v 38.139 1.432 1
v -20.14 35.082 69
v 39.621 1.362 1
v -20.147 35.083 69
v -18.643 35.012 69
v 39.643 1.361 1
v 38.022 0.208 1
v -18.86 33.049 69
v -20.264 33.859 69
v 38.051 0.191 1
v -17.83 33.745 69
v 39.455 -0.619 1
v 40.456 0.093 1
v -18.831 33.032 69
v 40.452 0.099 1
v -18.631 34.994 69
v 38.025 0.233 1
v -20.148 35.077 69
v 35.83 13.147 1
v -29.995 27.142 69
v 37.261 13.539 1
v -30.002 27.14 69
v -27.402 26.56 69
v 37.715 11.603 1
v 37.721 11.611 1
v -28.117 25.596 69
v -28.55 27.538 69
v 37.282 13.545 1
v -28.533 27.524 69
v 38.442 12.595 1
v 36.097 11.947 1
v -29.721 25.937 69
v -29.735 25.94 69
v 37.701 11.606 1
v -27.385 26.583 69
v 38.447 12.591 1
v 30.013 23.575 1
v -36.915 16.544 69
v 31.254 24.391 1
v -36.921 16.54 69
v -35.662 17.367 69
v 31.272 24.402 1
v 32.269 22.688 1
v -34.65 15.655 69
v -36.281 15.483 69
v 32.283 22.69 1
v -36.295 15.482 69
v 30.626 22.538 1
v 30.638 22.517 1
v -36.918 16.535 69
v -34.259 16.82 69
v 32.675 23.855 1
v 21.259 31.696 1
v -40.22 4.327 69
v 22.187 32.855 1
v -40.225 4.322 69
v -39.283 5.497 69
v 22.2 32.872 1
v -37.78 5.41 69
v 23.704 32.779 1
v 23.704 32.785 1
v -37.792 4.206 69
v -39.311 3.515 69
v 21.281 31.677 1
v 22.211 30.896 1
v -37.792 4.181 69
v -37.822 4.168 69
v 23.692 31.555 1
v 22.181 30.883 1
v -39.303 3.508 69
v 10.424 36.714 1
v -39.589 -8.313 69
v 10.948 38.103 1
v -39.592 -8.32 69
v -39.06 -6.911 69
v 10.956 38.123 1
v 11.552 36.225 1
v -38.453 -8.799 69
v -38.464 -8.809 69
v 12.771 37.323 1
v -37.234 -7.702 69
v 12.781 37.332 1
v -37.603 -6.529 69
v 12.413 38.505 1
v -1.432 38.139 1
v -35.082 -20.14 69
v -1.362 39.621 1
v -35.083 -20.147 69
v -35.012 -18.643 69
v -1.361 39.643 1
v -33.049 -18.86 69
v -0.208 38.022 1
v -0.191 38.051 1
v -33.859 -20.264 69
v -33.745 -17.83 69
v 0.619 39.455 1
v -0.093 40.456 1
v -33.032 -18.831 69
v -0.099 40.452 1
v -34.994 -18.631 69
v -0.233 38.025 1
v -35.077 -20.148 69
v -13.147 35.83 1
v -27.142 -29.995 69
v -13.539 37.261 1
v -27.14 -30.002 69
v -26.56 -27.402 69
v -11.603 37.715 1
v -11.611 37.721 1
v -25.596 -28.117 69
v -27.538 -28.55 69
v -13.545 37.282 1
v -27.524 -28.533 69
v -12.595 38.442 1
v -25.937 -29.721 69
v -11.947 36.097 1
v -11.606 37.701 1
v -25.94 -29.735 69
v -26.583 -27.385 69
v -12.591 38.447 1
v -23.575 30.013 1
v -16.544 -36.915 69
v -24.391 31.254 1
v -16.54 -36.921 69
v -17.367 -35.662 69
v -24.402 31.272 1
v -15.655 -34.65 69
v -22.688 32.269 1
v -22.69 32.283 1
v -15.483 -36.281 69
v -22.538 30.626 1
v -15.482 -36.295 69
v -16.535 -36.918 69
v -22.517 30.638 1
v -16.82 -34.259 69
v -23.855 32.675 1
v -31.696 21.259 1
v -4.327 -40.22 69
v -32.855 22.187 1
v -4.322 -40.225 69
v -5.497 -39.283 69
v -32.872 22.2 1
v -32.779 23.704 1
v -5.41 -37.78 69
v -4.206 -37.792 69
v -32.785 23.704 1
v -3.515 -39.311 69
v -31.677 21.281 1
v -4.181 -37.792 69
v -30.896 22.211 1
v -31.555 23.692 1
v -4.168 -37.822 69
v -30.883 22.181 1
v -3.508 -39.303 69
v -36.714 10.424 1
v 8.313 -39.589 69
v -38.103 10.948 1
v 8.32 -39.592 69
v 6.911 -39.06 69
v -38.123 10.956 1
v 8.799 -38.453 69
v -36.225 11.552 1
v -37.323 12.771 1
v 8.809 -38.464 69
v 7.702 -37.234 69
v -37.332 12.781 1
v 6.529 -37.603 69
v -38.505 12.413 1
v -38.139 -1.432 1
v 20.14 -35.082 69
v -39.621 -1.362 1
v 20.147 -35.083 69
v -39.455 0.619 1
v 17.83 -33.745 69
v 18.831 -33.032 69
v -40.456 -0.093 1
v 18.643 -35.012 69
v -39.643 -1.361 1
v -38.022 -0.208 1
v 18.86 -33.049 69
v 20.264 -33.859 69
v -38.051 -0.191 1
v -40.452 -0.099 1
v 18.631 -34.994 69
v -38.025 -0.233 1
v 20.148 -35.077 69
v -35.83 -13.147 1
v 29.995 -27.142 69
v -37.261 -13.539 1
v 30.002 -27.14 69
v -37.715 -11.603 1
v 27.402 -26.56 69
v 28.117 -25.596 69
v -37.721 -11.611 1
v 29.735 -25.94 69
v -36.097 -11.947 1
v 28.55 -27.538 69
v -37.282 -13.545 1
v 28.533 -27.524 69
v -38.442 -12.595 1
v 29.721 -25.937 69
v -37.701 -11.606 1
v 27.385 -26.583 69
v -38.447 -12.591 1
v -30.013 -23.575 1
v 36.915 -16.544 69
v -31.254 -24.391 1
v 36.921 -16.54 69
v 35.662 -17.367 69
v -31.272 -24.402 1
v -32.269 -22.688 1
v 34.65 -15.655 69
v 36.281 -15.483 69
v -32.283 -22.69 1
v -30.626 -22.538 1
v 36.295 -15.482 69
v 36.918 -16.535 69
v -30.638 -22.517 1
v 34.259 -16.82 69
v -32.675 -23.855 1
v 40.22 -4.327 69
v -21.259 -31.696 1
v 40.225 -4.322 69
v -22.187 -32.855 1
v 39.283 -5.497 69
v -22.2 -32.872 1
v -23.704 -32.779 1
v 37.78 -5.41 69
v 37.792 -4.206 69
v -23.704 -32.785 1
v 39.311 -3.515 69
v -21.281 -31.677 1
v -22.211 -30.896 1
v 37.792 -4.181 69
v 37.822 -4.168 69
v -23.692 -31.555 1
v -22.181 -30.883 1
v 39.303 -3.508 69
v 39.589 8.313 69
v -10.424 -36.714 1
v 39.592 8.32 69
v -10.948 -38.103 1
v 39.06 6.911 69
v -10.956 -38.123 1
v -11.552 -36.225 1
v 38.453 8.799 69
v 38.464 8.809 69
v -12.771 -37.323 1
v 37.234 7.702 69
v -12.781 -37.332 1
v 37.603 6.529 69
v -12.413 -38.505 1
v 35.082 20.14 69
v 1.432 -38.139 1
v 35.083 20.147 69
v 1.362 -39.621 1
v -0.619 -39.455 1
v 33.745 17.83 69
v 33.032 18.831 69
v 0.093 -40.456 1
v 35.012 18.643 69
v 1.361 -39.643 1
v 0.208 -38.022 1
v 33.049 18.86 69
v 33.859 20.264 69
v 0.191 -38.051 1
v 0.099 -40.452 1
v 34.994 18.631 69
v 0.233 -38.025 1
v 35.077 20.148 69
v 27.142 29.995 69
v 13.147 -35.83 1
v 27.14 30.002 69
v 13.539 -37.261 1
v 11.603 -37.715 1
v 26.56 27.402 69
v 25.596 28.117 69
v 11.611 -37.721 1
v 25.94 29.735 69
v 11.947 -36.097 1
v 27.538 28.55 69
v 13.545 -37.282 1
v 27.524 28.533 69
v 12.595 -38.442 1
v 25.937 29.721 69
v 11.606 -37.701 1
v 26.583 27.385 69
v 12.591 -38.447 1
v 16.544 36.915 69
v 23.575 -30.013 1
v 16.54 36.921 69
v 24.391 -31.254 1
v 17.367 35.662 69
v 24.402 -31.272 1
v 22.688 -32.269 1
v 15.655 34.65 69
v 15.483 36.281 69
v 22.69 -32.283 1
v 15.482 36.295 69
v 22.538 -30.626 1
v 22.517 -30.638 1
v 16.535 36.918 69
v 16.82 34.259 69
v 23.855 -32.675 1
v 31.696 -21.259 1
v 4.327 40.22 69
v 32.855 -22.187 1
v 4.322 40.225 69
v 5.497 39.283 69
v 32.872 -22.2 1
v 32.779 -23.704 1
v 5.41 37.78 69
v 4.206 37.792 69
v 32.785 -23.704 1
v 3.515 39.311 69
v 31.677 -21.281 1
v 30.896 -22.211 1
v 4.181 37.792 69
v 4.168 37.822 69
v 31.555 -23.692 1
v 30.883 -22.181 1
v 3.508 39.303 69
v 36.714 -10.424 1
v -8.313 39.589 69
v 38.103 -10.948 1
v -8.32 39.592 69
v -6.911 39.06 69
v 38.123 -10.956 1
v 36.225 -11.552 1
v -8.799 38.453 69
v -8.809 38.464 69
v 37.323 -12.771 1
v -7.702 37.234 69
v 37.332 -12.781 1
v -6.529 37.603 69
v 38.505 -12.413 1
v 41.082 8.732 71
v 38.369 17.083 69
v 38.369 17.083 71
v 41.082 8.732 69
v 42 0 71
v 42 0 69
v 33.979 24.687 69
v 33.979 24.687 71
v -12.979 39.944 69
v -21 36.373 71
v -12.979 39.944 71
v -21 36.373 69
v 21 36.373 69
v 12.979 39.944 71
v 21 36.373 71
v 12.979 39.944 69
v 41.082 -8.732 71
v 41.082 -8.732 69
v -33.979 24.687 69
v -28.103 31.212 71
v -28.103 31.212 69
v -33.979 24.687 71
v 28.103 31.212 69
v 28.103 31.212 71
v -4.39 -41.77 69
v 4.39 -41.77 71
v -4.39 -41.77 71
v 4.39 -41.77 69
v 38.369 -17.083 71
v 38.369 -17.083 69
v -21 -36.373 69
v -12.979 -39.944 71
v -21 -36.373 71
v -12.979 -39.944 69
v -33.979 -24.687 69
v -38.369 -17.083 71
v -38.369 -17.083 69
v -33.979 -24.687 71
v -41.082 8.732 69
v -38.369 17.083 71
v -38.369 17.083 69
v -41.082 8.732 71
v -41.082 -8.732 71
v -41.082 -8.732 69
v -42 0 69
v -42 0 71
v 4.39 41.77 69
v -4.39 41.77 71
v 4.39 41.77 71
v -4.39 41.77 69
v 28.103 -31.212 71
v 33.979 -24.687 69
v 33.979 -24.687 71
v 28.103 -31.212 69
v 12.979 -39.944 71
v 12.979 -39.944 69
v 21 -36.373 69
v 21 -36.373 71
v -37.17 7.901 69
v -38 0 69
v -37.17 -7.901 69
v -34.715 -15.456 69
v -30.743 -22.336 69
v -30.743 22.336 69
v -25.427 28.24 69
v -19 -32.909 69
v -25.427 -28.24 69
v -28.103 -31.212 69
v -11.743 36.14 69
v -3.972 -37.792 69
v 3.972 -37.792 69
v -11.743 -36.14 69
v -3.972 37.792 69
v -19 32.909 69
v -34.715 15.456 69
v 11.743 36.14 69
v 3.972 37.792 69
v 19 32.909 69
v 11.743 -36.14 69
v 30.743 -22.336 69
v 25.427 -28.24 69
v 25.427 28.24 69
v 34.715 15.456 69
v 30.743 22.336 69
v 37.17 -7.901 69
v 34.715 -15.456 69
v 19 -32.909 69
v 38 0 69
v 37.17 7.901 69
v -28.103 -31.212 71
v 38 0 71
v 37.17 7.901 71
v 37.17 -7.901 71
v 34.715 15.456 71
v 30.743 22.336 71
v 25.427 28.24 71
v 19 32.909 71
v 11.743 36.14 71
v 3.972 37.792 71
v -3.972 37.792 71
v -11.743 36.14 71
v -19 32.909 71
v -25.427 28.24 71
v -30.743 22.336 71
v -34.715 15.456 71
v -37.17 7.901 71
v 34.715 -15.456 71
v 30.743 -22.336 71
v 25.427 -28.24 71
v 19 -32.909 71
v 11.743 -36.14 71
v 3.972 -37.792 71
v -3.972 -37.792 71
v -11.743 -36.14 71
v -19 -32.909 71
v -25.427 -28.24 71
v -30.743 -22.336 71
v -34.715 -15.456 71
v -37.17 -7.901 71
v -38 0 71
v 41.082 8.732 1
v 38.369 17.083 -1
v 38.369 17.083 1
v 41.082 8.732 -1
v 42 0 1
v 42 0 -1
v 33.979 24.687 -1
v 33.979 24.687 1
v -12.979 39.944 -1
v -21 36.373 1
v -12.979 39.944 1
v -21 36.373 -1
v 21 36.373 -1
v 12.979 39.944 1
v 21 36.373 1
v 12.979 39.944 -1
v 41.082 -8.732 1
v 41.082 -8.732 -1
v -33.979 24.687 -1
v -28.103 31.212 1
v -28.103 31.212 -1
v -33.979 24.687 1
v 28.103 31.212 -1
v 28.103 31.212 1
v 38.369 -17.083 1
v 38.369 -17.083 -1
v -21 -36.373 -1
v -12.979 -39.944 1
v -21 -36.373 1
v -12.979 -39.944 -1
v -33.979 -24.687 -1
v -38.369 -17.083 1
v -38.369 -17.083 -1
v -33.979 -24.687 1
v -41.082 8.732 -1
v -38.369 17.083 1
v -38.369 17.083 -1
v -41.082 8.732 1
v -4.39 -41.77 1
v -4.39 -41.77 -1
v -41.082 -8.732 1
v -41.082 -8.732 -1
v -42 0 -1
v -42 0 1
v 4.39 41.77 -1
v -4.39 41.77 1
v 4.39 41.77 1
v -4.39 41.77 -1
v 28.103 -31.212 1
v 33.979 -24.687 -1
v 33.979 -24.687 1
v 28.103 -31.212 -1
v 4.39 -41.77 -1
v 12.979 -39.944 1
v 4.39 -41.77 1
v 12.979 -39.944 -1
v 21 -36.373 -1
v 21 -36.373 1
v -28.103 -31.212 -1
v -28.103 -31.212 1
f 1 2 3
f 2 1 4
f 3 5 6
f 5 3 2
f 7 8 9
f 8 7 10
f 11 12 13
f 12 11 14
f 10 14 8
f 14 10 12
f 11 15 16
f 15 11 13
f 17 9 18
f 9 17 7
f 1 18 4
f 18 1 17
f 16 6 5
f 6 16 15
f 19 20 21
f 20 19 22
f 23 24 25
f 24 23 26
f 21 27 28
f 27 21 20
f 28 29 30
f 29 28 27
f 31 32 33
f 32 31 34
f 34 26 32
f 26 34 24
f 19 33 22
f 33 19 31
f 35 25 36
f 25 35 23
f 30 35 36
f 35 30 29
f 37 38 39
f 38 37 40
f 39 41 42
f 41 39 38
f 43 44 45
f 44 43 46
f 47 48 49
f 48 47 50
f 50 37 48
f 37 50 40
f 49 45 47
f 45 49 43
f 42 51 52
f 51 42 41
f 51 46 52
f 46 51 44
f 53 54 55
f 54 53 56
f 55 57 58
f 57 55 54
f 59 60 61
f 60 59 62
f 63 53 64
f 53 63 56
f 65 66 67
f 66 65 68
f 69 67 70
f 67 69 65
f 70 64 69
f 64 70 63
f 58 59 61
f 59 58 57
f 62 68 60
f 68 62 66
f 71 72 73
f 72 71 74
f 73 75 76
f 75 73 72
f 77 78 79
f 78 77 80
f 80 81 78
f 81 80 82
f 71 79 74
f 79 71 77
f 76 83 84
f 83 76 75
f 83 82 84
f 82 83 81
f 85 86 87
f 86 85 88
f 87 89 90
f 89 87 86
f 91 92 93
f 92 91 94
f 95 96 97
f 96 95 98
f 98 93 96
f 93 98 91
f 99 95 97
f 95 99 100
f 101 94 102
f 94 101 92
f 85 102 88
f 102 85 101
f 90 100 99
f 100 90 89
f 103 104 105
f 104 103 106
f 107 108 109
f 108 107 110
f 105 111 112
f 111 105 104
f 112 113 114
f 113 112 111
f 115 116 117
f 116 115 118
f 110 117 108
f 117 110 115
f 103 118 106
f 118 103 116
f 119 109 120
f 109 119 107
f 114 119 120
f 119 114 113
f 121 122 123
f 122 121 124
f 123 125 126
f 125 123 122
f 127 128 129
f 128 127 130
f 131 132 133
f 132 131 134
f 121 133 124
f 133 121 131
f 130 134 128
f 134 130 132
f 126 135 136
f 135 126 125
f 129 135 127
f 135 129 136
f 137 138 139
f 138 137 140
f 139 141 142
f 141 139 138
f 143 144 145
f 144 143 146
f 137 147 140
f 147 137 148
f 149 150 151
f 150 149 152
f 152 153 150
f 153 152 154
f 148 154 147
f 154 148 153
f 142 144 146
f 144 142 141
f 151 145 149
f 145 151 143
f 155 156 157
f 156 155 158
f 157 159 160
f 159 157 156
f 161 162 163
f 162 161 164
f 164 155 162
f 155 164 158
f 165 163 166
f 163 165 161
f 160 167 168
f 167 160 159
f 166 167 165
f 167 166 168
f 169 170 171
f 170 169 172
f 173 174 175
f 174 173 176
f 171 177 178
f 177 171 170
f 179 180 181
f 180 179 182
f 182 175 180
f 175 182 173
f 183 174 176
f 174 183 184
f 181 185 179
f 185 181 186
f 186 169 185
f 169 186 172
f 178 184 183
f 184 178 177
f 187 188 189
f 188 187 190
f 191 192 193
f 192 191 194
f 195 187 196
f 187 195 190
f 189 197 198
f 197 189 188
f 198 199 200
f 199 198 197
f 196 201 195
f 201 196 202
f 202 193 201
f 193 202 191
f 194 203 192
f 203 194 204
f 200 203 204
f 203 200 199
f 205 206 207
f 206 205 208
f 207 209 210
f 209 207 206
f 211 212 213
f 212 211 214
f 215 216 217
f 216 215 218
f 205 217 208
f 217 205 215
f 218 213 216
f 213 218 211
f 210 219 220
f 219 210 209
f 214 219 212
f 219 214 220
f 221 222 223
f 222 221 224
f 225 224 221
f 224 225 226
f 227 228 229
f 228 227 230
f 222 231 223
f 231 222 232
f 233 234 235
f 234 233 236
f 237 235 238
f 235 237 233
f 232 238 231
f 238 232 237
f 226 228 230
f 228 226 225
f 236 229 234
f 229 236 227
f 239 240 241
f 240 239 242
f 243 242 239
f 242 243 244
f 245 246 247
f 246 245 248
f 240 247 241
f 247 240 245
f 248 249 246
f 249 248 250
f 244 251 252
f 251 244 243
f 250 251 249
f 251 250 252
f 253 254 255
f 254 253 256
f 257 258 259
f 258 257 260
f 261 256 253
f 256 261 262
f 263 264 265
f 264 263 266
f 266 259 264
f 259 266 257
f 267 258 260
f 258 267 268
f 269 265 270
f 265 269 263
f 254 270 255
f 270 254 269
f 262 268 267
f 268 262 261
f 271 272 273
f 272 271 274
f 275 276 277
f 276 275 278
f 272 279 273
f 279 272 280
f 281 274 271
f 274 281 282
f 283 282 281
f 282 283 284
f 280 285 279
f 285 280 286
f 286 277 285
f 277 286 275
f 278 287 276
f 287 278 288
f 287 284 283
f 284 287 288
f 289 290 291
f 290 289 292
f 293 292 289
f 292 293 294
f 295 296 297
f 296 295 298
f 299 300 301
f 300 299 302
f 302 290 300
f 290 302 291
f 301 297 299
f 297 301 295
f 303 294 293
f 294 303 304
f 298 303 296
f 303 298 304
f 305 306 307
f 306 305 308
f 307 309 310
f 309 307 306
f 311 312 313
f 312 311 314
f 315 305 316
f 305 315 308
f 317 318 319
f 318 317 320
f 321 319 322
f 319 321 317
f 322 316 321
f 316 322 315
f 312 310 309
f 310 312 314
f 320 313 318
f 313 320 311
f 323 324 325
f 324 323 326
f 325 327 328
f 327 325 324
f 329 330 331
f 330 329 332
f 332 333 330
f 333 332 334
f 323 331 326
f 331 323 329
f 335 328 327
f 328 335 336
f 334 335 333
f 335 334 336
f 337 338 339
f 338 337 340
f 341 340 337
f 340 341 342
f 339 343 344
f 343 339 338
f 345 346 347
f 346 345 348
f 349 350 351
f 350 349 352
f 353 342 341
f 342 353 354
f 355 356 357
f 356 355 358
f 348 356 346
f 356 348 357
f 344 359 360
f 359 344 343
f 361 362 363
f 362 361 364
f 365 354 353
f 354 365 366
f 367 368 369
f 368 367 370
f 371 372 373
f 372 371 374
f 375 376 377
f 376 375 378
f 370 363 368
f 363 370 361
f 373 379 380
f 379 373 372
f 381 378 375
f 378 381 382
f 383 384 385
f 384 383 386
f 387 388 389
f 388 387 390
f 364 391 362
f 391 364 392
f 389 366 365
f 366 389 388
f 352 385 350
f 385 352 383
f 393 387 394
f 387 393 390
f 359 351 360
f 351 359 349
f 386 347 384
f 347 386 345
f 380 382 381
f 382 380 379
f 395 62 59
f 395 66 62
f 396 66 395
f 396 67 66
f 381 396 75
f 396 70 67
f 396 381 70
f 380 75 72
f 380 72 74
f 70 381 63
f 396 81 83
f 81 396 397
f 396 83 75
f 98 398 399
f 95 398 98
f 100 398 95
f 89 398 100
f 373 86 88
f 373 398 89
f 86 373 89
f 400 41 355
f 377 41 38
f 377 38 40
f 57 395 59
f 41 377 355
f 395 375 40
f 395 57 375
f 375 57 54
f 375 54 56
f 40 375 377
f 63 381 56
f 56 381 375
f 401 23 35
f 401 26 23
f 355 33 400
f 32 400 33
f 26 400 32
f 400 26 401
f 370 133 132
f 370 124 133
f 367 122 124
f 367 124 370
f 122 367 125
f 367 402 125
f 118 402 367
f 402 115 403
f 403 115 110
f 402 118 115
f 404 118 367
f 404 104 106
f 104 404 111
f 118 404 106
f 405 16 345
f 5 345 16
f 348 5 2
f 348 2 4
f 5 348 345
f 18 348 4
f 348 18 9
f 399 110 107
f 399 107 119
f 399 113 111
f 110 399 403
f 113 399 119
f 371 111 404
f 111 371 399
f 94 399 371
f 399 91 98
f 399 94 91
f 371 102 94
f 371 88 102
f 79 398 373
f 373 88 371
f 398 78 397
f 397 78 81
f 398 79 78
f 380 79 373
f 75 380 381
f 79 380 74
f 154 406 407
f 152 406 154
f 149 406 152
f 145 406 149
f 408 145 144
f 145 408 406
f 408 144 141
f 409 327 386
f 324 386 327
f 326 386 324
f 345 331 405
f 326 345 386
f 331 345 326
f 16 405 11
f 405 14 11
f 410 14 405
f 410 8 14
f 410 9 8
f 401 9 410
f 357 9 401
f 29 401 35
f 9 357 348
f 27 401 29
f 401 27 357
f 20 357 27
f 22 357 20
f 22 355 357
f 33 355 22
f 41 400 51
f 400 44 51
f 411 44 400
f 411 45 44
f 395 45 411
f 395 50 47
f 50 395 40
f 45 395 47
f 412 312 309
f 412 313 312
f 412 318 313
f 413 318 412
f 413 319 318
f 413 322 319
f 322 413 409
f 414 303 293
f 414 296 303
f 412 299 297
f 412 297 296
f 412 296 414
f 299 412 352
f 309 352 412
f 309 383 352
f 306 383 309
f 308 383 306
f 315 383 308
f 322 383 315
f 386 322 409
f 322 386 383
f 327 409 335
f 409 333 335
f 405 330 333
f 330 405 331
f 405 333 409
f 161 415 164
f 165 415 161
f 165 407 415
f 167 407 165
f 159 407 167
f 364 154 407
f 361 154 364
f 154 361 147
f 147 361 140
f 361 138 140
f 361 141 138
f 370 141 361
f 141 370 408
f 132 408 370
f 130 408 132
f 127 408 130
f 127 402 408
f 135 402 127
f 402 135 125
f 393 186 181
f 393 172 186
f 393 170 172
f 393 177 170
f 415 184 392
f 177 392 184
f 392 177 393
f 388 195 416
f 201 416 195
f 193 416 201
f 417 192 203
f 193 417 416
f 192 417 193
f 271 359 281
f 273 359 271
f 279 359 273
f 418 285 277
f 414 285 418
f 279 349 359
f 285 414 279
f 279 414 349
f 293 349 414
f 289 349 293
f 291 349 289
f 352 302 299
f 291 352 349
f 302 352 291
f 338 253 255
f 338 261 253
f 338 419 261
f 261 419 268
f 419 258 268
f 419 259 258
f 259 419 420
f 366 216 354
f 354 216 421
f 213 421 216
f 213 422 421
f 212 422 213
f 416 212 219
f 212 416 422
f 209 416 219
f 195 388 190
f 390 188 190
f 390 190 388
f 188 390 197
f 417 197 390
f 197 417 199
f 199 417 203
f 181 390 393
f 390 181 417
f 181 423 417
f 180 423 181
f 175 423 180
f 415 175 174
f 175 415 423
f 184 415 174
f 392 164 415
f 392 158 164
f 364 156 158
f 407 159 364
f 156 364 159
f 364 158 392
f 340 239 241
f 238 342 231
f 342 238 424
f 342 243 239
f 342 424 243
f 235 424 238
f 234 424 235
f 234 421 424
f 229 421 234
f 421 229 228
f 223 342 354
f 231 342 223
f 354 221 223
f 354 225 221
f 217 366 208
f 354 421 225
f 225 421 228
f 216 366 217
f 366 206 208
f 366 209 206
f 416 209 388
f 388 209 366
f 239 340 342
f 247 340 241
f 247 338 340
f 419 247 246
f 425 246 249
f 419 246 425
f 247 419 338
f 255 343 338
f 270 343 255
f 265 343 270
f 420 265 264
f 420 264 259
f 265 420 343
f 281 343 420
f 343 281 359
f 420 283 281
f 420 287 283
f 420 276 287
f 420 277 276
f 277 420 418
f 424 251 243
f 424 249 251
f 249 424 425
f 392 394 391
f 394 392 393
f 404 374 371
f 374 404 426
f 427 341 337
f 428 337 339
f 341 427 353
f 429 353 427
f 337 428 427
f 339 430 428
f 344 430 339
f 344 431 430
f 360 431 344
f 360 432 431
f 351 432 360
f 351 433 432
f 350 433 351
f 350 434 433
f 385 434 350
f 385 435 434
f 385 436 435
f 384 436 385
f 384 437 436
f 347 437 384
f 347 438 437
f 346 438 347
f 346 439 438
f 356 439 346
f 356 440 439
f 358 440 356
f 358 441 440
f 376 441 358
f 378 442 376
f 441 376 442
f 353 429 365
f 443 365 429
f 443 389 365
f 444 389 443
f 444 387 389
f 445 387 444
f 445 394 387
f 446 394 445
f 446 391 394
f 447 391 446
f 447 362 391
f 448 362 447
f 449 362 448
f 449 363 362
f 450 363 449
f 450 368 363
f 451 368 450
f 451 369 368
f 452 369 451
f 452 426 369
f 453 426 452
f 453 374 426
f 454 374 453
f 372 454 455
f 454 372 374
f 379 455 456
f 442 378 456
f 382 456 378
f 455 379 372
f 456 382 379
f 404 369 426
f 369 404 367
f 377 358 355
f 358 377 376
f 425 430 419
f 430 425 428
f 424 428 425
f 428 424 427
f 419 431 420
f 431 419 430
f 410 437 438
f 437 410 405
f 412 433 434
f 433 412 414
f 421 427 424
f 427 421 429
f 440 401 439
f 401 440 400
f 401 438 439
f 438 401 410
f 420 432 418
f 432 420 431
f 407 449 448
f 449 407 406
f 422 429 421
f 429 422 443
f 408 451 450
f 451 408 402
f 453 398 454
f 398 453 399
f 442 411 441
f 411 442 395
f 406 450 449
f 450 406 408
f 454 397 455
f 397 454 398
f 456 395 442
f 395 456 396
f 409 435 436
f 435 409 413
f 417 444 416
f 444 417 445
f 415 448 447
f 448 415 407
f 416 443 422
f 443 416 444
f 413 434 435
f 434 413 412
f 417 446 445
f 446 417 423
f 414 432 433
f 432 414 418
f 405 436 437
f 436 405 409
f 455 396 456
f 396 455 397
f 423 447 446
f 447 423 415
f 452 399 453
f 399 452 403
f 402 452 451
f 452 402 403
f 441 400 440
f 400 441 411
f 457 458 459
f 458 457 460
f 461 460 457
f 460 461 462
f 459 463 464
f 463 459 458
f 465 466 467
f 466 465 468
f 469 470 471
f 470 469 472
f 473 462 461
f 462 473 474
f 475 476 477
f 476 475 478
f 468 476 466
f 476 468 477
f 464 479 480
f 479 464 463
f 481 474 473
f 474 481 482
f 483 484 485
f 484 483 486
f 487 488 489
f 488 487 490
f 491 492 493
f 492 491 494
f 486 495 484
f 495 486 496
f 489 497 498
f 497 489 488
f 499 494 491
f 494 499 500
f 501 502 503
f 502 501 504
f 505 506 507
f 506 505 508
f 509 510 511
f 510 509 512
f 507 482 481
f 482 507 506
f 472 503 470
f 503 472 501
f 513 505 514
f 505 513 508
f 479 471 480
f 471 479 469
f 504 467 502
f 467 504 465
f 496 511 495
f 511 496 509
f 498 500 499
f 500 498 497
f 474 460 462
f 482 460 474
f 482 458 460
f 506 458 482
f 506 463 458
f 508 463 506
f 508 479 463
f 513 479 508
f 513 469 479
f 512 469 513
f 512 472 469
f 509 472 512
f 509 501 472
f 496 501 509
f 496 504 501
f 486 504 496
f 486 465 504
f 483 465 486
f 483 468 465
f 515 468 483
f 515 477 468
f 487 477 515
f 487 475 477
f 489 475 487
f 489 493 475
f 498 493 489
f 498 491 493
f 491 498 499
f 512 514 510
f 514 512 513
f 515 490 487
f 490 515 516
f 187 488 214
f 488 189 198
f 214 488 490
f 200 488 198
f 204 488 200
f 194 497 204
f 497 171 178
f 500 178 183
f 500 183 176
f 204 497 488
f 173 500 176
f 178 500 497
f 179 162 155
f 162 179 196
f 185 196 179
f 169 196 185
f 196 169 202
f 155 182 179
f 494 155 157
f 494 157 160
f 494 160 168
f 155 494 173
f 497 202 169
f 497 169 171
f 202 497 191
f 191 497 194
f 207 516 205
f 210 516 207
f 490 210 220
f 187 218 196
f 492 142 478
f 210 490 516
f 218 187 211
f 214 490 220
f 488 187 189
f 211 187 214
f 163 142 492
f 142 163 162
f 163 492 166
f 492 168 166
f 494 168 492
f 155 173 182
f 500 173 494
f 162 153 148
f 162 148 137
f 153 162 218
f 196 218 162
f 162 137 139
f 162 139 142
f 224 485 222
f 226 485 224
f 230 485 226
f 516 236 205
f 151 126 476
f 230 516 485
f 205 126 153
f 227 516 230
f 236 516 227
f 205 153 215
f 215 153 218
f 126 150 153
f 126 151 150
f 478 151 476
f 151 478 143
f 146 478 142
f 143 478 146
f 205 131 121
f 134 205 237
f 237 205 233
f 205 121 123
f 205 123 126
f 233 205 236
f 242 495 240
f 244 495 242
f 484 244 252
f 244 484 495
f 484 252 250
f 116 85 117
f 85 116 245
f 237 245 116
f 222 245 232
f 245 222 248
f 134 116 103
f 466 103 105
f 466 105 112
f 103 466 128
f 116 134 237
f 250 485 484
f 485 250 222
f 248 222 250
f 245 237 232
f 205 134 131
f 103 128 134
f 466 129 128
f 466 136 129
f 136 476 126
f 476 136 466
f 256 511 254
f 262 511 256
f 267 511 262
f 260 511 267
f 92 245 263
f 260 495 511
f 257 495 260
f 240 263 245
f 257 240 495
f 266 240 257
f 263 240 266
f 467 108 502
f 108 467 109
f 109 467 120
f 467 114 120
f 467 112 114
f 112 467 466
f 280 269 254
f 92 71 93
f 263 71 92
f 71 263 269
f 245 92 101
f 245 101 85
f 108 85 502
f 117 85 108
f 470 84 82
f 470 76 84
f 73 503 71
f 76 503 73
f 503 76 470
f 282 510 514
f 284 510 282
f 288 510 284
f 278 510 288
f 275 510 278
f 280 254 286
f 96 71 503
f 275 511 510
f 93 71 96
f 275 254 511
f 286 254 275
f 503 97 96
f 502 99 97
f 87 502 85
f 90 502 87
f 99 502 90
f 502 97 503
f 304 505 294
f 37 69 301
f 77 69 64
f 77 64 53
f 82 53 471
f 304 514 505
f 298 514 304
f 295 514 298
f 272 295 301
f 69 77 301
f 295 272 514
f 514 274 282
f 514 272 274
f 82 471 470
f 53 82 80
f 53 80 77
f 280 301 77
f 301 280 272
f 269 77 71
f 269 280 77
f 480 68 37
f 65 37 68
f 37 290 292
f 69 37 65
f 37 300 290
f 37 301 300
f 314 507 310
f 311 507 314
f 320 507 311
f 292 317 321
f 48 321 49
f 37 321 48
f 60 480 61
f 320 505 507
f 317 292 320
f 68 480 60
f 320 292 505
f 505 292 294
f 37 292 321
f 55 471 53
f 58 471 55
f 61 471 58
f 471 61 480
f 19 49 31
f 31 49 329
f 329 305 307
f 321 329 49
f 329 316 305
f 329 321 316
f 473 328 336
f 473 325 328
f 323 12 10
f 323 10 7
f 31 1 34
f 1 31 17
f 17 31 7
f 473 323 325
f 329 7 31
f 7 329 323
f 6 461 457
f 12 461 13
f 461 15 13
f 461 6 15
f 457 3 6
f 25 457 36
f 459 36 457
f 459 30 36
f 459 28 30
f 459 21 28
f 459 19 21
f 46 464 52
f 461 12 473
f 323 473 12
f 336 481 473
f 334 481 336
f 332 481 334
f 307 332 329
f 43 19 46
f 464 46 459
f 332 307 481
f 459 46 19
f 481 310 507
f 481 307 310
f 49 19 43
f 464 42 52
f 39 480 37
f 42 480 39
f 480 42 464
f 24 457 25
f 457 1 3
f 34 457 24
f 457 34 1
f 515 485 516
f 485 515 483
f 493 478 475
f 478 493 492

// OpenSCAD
// twisted cage

// overall height of basket
height=70; // [10:200]

// radius of basket
radius=40;  // [10:100]

// thickness of base and spokes (tenths)
th=20;  // [1:50]

// amount of twist from top to bottom of basket
an1=120;  // [0:180]

// number of spokes
nsp=20; // [1:50]

// just twist clockwise or overlap twists both ways
twist = "clockwise"; // [clockwise, counterclockwise, both]

thickness = th / 10;

module spoke(ang, h, r) {
	x=r - cos(ang) * r;
	y=sin(ang) * r;
	h1=sqrt(x*x+y*y);
	h2=sqrt(x * x + y * y + h * h);
	a1=atan2(h1, h);
	a2=atan2(x, y);
	translate([r, 0, 0]) {
		if (twist == "clockwise") {
			rotate([0, 0, a2])
				rotate([-a1, 0, 0])
					cylinder(d=thickness, h=h2);
		}
		if (twist == "counterclockwise") {
			rotate([0, 0, -a2])
				rotate([a1, 0, 0])
					cylinder(d=thickness, h=h2);
		}
		if (twist == "both") {
			rotate([0, 0, a2])
				rotate([-a1, 0, 0])
					cylinder(d=thickness, h=h2);
			rotate([0, 0, -a2])
				rotate([a1, 0, 0])
					cylinder(d=thickness, h=h2);
		}
	}
}

for (i=[0:nsp-1]) {
	rotate([0, 0, i * (360/nsp)])
		spoke(an1, height, radius);
}

/* base */
translate([0, 0, -thickness/2])
	cylinder(h=thickness, r=radius + thickness);

/* top ring */
translate([0, 0, height - thickness / 2])
	difference() {
		cylinder(h=thickness, r=radius + thickness);
		translate([0, 0, -0.0001])
		cylinder(h=thickness + 0.0002, r=radius - thickness);
	}

// eof
